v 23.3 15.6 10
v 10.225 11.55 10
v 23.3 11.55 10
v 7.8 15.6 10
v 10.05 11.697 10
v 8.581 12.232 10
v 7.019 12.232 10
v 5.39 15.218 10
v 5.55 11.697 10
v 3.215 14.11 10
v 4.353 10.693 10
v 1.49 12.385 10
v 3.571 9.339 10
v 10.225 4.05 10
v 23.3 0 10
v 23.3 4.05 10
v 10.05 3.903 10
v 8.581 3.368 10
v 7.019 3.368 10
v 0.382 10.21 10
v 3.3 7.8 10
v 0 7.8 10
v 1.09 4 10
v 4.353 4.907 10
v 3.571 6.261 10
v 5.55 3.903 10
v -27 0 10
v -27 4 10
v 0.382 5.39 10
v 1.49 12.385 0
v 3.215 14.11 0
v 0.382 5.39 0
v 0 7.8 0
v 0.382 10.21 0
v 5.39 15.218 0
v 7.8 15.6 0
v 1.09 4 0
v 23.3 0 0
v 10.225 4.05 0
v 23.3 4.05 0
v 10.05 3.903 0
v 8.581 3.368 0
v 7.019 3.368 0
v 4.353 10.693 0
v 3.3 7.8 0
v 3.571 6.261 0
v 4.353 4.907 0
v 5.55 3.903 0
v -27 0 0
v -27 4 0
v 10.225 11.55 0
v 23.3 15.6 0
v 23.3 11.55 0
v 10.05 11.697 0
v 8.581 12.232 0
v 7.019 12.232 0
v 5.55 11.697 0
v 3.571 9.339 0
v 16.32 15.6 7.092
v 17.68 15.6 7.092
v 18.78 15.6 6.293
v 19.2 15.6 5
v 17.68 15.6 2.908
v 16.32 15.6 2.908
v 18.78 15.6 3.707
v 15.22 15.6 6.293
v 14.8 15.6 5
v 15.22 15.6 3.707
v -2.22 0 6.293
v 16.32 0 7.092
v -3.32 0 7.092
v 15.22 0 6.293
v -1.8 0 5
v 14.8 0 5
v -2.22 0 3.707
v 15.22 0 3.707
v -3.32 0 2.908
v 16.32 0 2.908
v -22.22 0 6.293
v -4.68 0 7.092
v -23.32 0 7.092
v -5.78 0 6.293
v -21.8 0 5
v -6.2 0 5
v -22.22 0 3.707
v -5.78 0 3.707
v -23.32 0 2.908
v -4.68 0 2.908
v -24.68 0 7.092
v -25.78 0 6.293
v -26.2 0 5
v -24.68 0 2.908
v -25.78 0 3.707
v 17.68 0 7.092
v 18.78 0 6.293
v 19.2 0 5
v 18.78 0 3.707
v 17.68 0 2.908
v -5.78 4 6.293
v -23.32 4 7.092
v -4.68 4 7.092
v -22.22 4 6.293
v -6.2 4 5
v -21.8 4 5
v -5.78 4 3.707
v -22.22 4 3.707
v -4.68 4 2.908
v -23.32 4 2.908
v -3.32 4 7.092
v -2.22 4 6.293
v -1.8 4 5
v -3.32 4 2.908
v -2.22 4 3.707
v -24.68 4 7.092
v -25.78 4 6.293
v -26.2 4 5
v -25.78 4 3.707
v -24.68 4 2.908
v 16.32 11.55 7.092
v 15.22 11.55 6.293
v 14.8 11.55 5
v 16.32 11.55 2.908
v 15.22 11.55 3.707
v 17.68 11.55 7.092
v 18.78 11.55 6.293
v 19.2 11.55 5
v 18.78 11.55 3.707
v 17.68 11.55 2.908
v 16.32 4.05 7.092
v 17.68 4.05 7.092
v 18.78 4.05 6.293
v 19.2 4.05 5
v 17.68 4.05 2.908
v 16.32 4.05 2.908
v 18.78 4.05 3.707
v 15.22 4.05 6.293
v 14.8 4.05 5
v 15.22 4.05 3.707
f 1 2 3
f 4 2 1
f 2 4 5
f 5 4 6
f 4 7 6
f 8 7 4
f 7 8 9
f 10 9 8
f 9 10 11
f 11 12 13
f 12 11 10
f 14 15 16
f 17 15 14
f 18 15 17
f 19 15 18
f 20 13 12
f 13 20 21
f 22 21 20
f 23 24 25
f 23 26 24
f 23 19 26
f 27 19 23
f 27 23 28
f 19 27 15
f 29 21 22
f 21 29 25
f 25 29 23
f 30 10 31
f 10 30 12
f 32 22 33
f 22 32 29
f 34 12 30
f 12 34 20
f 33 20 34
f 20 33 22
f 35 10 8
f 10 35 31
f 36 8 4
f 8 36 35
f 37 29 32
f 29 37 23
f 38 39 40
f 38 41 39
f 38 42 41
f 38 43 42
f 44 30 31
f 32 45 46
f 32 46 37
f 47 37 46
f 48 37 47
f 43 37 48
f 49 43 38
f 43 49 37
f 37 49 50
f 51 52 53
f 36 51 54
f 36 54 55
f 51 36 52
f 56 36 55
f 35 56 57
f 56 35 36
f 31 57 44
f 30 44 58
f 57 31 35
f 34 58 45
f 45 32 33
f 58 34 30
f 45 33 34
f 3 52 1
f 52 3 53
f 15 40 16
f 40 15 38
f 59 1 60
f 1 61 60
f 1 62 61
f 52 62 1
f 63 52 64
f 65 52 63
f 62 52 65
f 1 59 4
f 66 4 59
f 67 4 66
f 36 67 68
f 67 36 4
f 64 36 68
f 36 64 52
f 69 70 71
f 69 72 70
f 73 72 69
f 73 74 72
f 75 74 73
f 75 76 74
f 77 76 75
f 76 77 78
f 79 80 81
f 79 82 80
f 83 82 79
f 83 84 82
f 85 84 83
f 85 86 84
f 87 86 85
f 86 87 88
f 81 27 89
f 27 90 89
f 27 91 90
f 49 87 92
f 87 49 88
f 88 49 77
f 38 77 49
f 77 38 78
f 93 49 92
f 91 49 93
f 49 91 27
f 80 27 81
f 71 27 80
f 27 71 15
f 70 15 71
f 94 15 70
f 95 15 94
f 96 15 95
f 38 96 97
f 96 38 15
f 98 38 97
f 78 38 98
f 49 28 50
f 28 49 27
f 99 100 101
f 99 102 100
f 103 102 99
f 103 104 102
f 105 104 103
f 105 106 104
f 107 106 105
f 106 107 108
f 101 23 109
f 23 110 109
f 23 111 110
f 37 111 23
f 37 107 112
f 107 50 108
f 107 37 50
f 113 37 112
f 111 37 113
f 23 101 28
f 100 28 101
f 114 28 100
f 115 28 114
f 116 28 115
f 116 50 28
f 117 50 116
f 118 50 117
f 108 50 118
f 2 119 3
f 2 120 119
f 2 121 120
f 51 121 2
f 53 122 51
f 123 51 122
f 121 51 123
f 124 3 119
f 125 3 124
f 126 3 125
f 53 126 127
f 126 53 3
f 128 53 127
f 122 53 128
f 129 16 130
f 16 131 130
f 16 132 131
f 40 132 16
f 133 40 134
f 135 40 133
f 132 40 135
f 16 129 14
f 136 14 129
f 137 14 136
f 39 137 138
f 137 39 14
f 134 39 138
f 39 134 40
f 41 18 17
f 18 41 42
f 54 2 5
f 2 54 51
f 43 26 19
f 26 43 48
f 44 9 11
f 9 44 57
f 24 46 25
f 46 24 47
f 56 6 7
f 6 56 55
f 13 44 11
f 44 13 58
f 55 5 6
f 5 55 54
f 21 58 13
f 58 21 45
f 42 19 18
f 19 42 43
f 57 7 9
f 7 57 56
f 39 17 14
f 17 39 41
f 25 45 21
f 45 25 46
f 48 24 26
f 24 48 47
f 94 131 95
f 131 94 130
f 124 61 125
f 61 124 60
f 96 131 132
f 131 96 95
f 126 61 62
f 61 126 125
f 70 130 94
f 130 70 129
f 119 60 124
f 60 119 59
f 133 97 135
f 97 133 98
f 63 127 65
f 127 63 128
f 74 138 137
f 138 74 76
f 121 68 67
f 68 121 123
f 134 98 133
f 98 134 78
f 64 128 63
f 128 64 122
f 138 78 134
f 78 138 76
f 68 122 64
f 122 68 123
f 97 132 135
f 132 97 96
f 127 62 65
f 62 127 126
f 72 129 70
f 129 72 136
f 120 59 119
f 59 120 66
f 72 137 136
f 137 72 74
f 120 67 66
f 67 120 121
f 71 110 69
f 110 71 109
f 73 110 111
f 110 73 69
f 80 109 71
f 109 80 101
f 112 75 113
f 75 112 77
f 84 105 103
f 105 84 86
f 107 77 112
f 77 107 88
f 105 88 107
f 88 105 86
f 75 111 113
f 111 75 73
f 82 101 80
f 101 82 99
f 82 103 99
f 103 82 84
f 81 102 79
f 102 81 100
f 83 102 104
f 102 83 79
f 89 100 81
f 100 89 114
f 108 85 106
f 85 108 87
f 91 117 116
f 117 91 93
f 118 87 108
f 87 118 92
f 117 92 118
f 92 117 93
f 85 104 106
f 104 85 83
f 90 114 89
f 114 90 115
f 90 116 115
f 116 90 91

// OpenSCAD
// file: configuration.scad
// PRUSA Mendel  
// Configuration file
// GNU GPL v2
// Josef Pra
// josefprusa@me.com
// prusadjs.cz
// http://www.reprap.org/wiki/Prusa_Mendel
// http://github.com/prusajr/PrusaMendel


// PLEASE SELECT ONE OF THE CONFIGURATIONS BELOW
// BY UN-COMMENTING IT


variant=0; //0 for metric
//variant=1; //1 for SAE
if(variant==0){
echo("variant: metric");
}else if(variant==1){
echo("variant: sae");
} else{
echo("WARNING: INVALID CONFIGURATION");
}




vars=[
//[m8_dia, m8_nut, m4_dia, m4_nut, m3_dia, m3_nut, bush_dia, mot_shaft, bush_rod, bush_outerdia, bush_length]
[9,16.4,5,9,4.4,7,11,5.3,8,16,11],//metric
[9,15.7,5.5,10.6,5.5,10.6,11.5,5.3,7.9375,16,11]//SAE
];


//BUSHING TYPE Can generate three versions
// 1 - regular old ones
// 2 - helical ones
// 3 - holders for brass or any other bought bushings
bushing_type = 2;


//Round corner diameter
round_corner_diameter = 8;


//Thin wall size
layer_height = 0.4;
perimeter_width_over_thicknes = 1.6;
infill_widht_over_thickness = 1.55;
thin_wall = 2*(perimeter_width_over_thicknes*layer_height+infill_widht_over_thickness*layer_height);
if(thin_wall<2){
	echo("Check thin wall size, its below 2mm!");
}
echo(thin_wall);


//DO NOT TOUCH THIS SECTION!
m8_diameter = vars[variant][0];
m8_nut_diameter = vars[variant][1];
m4_diameter = vars[variant][2];
m4_nut_diameter = vars[variant][3];
m3_diameter = vars[variant][4];
m3_nut_diameter = vars[variant][5];
bushing_diameter = vars[variant][6];
motor_shaft=vars[variant][7];
bushing_rodsize = vars[variant][8];
bushing_outerDiameter = vars[variant][9];
bushing_lenght = vars[variant][10];




// MINI-HUXLEY VERSION (TODO, just place holder)
// include <configuration-huxley.scad>


// MEGA VERSION (TODO, just place holder)
// include <configuration-mega.scad>




// Some basic functions, probably should be somewhere else
module roundcorner(diameter){
	difference(){
		cube(size = [diameter,diameter,99], center = false);
		translate(v = [diameter, diameter, 0]) cylinder(h = 100, r=diameter, center=true);
	}
}
// main file
// PRUSA Mendel  
// Endstop holder
// Used to attach endstops to 8mm rods
// GNU GPL v2
// Josef Pra
// josefprusa@me.com
// prusadjs.cz
// http://www.reprap.org/wiki/Prusa_Mendel
// http://github.com/prusajr/PrusaMendel


include <configuration.scad>


/**
 * @id endstop-holder
 * @name Endstop holder
 * @category Printed
 * @using 1 m3x20
 * @using 1 m3nut
 * @using 2 m3washer
 */
module endstop(){
outer_diameter = m8_diameter/2+3.3;
screw_hole_spacing = 20;
opening_size = m8_diameter-1.5; //openingsize


difference(){
	union(){




		translate([outer_diameter, outer_diameter, 0]) cylinder(h =10, r = outer_diameter, $fn = 20);
		translate([outer_diameter, 0, 0]) cube([15.5,outer_diameter*2,10]);
		translate([-27, 0, 0]) cube([35, 4, 10]);
	}








	translate([9, outer_diameter-opening_size/2, 0]) cube([18,opening_size,20]);
	translate([outer_diameter, outer_diameter, 0]) cylinder(h =20, r = m8_diameter/2, $fn = 18);
	translate([17, 17, 5]) rotate([90, 0, 0]) cylinder(h =20, r = m3_diameter/2, $fn = 10);
	translate([-4, 17, 5]) rotate([90, 0, 0]) cylinder(h =20, r = m3_diameter/2, $fn = 10);
	translate([-(4+screw_hole_spacing), 17, 5]) rotate([90, 0, 0]) cylinder(h =20, r = m3_diameter/2, $fn = 10);
}
}
endstop();
